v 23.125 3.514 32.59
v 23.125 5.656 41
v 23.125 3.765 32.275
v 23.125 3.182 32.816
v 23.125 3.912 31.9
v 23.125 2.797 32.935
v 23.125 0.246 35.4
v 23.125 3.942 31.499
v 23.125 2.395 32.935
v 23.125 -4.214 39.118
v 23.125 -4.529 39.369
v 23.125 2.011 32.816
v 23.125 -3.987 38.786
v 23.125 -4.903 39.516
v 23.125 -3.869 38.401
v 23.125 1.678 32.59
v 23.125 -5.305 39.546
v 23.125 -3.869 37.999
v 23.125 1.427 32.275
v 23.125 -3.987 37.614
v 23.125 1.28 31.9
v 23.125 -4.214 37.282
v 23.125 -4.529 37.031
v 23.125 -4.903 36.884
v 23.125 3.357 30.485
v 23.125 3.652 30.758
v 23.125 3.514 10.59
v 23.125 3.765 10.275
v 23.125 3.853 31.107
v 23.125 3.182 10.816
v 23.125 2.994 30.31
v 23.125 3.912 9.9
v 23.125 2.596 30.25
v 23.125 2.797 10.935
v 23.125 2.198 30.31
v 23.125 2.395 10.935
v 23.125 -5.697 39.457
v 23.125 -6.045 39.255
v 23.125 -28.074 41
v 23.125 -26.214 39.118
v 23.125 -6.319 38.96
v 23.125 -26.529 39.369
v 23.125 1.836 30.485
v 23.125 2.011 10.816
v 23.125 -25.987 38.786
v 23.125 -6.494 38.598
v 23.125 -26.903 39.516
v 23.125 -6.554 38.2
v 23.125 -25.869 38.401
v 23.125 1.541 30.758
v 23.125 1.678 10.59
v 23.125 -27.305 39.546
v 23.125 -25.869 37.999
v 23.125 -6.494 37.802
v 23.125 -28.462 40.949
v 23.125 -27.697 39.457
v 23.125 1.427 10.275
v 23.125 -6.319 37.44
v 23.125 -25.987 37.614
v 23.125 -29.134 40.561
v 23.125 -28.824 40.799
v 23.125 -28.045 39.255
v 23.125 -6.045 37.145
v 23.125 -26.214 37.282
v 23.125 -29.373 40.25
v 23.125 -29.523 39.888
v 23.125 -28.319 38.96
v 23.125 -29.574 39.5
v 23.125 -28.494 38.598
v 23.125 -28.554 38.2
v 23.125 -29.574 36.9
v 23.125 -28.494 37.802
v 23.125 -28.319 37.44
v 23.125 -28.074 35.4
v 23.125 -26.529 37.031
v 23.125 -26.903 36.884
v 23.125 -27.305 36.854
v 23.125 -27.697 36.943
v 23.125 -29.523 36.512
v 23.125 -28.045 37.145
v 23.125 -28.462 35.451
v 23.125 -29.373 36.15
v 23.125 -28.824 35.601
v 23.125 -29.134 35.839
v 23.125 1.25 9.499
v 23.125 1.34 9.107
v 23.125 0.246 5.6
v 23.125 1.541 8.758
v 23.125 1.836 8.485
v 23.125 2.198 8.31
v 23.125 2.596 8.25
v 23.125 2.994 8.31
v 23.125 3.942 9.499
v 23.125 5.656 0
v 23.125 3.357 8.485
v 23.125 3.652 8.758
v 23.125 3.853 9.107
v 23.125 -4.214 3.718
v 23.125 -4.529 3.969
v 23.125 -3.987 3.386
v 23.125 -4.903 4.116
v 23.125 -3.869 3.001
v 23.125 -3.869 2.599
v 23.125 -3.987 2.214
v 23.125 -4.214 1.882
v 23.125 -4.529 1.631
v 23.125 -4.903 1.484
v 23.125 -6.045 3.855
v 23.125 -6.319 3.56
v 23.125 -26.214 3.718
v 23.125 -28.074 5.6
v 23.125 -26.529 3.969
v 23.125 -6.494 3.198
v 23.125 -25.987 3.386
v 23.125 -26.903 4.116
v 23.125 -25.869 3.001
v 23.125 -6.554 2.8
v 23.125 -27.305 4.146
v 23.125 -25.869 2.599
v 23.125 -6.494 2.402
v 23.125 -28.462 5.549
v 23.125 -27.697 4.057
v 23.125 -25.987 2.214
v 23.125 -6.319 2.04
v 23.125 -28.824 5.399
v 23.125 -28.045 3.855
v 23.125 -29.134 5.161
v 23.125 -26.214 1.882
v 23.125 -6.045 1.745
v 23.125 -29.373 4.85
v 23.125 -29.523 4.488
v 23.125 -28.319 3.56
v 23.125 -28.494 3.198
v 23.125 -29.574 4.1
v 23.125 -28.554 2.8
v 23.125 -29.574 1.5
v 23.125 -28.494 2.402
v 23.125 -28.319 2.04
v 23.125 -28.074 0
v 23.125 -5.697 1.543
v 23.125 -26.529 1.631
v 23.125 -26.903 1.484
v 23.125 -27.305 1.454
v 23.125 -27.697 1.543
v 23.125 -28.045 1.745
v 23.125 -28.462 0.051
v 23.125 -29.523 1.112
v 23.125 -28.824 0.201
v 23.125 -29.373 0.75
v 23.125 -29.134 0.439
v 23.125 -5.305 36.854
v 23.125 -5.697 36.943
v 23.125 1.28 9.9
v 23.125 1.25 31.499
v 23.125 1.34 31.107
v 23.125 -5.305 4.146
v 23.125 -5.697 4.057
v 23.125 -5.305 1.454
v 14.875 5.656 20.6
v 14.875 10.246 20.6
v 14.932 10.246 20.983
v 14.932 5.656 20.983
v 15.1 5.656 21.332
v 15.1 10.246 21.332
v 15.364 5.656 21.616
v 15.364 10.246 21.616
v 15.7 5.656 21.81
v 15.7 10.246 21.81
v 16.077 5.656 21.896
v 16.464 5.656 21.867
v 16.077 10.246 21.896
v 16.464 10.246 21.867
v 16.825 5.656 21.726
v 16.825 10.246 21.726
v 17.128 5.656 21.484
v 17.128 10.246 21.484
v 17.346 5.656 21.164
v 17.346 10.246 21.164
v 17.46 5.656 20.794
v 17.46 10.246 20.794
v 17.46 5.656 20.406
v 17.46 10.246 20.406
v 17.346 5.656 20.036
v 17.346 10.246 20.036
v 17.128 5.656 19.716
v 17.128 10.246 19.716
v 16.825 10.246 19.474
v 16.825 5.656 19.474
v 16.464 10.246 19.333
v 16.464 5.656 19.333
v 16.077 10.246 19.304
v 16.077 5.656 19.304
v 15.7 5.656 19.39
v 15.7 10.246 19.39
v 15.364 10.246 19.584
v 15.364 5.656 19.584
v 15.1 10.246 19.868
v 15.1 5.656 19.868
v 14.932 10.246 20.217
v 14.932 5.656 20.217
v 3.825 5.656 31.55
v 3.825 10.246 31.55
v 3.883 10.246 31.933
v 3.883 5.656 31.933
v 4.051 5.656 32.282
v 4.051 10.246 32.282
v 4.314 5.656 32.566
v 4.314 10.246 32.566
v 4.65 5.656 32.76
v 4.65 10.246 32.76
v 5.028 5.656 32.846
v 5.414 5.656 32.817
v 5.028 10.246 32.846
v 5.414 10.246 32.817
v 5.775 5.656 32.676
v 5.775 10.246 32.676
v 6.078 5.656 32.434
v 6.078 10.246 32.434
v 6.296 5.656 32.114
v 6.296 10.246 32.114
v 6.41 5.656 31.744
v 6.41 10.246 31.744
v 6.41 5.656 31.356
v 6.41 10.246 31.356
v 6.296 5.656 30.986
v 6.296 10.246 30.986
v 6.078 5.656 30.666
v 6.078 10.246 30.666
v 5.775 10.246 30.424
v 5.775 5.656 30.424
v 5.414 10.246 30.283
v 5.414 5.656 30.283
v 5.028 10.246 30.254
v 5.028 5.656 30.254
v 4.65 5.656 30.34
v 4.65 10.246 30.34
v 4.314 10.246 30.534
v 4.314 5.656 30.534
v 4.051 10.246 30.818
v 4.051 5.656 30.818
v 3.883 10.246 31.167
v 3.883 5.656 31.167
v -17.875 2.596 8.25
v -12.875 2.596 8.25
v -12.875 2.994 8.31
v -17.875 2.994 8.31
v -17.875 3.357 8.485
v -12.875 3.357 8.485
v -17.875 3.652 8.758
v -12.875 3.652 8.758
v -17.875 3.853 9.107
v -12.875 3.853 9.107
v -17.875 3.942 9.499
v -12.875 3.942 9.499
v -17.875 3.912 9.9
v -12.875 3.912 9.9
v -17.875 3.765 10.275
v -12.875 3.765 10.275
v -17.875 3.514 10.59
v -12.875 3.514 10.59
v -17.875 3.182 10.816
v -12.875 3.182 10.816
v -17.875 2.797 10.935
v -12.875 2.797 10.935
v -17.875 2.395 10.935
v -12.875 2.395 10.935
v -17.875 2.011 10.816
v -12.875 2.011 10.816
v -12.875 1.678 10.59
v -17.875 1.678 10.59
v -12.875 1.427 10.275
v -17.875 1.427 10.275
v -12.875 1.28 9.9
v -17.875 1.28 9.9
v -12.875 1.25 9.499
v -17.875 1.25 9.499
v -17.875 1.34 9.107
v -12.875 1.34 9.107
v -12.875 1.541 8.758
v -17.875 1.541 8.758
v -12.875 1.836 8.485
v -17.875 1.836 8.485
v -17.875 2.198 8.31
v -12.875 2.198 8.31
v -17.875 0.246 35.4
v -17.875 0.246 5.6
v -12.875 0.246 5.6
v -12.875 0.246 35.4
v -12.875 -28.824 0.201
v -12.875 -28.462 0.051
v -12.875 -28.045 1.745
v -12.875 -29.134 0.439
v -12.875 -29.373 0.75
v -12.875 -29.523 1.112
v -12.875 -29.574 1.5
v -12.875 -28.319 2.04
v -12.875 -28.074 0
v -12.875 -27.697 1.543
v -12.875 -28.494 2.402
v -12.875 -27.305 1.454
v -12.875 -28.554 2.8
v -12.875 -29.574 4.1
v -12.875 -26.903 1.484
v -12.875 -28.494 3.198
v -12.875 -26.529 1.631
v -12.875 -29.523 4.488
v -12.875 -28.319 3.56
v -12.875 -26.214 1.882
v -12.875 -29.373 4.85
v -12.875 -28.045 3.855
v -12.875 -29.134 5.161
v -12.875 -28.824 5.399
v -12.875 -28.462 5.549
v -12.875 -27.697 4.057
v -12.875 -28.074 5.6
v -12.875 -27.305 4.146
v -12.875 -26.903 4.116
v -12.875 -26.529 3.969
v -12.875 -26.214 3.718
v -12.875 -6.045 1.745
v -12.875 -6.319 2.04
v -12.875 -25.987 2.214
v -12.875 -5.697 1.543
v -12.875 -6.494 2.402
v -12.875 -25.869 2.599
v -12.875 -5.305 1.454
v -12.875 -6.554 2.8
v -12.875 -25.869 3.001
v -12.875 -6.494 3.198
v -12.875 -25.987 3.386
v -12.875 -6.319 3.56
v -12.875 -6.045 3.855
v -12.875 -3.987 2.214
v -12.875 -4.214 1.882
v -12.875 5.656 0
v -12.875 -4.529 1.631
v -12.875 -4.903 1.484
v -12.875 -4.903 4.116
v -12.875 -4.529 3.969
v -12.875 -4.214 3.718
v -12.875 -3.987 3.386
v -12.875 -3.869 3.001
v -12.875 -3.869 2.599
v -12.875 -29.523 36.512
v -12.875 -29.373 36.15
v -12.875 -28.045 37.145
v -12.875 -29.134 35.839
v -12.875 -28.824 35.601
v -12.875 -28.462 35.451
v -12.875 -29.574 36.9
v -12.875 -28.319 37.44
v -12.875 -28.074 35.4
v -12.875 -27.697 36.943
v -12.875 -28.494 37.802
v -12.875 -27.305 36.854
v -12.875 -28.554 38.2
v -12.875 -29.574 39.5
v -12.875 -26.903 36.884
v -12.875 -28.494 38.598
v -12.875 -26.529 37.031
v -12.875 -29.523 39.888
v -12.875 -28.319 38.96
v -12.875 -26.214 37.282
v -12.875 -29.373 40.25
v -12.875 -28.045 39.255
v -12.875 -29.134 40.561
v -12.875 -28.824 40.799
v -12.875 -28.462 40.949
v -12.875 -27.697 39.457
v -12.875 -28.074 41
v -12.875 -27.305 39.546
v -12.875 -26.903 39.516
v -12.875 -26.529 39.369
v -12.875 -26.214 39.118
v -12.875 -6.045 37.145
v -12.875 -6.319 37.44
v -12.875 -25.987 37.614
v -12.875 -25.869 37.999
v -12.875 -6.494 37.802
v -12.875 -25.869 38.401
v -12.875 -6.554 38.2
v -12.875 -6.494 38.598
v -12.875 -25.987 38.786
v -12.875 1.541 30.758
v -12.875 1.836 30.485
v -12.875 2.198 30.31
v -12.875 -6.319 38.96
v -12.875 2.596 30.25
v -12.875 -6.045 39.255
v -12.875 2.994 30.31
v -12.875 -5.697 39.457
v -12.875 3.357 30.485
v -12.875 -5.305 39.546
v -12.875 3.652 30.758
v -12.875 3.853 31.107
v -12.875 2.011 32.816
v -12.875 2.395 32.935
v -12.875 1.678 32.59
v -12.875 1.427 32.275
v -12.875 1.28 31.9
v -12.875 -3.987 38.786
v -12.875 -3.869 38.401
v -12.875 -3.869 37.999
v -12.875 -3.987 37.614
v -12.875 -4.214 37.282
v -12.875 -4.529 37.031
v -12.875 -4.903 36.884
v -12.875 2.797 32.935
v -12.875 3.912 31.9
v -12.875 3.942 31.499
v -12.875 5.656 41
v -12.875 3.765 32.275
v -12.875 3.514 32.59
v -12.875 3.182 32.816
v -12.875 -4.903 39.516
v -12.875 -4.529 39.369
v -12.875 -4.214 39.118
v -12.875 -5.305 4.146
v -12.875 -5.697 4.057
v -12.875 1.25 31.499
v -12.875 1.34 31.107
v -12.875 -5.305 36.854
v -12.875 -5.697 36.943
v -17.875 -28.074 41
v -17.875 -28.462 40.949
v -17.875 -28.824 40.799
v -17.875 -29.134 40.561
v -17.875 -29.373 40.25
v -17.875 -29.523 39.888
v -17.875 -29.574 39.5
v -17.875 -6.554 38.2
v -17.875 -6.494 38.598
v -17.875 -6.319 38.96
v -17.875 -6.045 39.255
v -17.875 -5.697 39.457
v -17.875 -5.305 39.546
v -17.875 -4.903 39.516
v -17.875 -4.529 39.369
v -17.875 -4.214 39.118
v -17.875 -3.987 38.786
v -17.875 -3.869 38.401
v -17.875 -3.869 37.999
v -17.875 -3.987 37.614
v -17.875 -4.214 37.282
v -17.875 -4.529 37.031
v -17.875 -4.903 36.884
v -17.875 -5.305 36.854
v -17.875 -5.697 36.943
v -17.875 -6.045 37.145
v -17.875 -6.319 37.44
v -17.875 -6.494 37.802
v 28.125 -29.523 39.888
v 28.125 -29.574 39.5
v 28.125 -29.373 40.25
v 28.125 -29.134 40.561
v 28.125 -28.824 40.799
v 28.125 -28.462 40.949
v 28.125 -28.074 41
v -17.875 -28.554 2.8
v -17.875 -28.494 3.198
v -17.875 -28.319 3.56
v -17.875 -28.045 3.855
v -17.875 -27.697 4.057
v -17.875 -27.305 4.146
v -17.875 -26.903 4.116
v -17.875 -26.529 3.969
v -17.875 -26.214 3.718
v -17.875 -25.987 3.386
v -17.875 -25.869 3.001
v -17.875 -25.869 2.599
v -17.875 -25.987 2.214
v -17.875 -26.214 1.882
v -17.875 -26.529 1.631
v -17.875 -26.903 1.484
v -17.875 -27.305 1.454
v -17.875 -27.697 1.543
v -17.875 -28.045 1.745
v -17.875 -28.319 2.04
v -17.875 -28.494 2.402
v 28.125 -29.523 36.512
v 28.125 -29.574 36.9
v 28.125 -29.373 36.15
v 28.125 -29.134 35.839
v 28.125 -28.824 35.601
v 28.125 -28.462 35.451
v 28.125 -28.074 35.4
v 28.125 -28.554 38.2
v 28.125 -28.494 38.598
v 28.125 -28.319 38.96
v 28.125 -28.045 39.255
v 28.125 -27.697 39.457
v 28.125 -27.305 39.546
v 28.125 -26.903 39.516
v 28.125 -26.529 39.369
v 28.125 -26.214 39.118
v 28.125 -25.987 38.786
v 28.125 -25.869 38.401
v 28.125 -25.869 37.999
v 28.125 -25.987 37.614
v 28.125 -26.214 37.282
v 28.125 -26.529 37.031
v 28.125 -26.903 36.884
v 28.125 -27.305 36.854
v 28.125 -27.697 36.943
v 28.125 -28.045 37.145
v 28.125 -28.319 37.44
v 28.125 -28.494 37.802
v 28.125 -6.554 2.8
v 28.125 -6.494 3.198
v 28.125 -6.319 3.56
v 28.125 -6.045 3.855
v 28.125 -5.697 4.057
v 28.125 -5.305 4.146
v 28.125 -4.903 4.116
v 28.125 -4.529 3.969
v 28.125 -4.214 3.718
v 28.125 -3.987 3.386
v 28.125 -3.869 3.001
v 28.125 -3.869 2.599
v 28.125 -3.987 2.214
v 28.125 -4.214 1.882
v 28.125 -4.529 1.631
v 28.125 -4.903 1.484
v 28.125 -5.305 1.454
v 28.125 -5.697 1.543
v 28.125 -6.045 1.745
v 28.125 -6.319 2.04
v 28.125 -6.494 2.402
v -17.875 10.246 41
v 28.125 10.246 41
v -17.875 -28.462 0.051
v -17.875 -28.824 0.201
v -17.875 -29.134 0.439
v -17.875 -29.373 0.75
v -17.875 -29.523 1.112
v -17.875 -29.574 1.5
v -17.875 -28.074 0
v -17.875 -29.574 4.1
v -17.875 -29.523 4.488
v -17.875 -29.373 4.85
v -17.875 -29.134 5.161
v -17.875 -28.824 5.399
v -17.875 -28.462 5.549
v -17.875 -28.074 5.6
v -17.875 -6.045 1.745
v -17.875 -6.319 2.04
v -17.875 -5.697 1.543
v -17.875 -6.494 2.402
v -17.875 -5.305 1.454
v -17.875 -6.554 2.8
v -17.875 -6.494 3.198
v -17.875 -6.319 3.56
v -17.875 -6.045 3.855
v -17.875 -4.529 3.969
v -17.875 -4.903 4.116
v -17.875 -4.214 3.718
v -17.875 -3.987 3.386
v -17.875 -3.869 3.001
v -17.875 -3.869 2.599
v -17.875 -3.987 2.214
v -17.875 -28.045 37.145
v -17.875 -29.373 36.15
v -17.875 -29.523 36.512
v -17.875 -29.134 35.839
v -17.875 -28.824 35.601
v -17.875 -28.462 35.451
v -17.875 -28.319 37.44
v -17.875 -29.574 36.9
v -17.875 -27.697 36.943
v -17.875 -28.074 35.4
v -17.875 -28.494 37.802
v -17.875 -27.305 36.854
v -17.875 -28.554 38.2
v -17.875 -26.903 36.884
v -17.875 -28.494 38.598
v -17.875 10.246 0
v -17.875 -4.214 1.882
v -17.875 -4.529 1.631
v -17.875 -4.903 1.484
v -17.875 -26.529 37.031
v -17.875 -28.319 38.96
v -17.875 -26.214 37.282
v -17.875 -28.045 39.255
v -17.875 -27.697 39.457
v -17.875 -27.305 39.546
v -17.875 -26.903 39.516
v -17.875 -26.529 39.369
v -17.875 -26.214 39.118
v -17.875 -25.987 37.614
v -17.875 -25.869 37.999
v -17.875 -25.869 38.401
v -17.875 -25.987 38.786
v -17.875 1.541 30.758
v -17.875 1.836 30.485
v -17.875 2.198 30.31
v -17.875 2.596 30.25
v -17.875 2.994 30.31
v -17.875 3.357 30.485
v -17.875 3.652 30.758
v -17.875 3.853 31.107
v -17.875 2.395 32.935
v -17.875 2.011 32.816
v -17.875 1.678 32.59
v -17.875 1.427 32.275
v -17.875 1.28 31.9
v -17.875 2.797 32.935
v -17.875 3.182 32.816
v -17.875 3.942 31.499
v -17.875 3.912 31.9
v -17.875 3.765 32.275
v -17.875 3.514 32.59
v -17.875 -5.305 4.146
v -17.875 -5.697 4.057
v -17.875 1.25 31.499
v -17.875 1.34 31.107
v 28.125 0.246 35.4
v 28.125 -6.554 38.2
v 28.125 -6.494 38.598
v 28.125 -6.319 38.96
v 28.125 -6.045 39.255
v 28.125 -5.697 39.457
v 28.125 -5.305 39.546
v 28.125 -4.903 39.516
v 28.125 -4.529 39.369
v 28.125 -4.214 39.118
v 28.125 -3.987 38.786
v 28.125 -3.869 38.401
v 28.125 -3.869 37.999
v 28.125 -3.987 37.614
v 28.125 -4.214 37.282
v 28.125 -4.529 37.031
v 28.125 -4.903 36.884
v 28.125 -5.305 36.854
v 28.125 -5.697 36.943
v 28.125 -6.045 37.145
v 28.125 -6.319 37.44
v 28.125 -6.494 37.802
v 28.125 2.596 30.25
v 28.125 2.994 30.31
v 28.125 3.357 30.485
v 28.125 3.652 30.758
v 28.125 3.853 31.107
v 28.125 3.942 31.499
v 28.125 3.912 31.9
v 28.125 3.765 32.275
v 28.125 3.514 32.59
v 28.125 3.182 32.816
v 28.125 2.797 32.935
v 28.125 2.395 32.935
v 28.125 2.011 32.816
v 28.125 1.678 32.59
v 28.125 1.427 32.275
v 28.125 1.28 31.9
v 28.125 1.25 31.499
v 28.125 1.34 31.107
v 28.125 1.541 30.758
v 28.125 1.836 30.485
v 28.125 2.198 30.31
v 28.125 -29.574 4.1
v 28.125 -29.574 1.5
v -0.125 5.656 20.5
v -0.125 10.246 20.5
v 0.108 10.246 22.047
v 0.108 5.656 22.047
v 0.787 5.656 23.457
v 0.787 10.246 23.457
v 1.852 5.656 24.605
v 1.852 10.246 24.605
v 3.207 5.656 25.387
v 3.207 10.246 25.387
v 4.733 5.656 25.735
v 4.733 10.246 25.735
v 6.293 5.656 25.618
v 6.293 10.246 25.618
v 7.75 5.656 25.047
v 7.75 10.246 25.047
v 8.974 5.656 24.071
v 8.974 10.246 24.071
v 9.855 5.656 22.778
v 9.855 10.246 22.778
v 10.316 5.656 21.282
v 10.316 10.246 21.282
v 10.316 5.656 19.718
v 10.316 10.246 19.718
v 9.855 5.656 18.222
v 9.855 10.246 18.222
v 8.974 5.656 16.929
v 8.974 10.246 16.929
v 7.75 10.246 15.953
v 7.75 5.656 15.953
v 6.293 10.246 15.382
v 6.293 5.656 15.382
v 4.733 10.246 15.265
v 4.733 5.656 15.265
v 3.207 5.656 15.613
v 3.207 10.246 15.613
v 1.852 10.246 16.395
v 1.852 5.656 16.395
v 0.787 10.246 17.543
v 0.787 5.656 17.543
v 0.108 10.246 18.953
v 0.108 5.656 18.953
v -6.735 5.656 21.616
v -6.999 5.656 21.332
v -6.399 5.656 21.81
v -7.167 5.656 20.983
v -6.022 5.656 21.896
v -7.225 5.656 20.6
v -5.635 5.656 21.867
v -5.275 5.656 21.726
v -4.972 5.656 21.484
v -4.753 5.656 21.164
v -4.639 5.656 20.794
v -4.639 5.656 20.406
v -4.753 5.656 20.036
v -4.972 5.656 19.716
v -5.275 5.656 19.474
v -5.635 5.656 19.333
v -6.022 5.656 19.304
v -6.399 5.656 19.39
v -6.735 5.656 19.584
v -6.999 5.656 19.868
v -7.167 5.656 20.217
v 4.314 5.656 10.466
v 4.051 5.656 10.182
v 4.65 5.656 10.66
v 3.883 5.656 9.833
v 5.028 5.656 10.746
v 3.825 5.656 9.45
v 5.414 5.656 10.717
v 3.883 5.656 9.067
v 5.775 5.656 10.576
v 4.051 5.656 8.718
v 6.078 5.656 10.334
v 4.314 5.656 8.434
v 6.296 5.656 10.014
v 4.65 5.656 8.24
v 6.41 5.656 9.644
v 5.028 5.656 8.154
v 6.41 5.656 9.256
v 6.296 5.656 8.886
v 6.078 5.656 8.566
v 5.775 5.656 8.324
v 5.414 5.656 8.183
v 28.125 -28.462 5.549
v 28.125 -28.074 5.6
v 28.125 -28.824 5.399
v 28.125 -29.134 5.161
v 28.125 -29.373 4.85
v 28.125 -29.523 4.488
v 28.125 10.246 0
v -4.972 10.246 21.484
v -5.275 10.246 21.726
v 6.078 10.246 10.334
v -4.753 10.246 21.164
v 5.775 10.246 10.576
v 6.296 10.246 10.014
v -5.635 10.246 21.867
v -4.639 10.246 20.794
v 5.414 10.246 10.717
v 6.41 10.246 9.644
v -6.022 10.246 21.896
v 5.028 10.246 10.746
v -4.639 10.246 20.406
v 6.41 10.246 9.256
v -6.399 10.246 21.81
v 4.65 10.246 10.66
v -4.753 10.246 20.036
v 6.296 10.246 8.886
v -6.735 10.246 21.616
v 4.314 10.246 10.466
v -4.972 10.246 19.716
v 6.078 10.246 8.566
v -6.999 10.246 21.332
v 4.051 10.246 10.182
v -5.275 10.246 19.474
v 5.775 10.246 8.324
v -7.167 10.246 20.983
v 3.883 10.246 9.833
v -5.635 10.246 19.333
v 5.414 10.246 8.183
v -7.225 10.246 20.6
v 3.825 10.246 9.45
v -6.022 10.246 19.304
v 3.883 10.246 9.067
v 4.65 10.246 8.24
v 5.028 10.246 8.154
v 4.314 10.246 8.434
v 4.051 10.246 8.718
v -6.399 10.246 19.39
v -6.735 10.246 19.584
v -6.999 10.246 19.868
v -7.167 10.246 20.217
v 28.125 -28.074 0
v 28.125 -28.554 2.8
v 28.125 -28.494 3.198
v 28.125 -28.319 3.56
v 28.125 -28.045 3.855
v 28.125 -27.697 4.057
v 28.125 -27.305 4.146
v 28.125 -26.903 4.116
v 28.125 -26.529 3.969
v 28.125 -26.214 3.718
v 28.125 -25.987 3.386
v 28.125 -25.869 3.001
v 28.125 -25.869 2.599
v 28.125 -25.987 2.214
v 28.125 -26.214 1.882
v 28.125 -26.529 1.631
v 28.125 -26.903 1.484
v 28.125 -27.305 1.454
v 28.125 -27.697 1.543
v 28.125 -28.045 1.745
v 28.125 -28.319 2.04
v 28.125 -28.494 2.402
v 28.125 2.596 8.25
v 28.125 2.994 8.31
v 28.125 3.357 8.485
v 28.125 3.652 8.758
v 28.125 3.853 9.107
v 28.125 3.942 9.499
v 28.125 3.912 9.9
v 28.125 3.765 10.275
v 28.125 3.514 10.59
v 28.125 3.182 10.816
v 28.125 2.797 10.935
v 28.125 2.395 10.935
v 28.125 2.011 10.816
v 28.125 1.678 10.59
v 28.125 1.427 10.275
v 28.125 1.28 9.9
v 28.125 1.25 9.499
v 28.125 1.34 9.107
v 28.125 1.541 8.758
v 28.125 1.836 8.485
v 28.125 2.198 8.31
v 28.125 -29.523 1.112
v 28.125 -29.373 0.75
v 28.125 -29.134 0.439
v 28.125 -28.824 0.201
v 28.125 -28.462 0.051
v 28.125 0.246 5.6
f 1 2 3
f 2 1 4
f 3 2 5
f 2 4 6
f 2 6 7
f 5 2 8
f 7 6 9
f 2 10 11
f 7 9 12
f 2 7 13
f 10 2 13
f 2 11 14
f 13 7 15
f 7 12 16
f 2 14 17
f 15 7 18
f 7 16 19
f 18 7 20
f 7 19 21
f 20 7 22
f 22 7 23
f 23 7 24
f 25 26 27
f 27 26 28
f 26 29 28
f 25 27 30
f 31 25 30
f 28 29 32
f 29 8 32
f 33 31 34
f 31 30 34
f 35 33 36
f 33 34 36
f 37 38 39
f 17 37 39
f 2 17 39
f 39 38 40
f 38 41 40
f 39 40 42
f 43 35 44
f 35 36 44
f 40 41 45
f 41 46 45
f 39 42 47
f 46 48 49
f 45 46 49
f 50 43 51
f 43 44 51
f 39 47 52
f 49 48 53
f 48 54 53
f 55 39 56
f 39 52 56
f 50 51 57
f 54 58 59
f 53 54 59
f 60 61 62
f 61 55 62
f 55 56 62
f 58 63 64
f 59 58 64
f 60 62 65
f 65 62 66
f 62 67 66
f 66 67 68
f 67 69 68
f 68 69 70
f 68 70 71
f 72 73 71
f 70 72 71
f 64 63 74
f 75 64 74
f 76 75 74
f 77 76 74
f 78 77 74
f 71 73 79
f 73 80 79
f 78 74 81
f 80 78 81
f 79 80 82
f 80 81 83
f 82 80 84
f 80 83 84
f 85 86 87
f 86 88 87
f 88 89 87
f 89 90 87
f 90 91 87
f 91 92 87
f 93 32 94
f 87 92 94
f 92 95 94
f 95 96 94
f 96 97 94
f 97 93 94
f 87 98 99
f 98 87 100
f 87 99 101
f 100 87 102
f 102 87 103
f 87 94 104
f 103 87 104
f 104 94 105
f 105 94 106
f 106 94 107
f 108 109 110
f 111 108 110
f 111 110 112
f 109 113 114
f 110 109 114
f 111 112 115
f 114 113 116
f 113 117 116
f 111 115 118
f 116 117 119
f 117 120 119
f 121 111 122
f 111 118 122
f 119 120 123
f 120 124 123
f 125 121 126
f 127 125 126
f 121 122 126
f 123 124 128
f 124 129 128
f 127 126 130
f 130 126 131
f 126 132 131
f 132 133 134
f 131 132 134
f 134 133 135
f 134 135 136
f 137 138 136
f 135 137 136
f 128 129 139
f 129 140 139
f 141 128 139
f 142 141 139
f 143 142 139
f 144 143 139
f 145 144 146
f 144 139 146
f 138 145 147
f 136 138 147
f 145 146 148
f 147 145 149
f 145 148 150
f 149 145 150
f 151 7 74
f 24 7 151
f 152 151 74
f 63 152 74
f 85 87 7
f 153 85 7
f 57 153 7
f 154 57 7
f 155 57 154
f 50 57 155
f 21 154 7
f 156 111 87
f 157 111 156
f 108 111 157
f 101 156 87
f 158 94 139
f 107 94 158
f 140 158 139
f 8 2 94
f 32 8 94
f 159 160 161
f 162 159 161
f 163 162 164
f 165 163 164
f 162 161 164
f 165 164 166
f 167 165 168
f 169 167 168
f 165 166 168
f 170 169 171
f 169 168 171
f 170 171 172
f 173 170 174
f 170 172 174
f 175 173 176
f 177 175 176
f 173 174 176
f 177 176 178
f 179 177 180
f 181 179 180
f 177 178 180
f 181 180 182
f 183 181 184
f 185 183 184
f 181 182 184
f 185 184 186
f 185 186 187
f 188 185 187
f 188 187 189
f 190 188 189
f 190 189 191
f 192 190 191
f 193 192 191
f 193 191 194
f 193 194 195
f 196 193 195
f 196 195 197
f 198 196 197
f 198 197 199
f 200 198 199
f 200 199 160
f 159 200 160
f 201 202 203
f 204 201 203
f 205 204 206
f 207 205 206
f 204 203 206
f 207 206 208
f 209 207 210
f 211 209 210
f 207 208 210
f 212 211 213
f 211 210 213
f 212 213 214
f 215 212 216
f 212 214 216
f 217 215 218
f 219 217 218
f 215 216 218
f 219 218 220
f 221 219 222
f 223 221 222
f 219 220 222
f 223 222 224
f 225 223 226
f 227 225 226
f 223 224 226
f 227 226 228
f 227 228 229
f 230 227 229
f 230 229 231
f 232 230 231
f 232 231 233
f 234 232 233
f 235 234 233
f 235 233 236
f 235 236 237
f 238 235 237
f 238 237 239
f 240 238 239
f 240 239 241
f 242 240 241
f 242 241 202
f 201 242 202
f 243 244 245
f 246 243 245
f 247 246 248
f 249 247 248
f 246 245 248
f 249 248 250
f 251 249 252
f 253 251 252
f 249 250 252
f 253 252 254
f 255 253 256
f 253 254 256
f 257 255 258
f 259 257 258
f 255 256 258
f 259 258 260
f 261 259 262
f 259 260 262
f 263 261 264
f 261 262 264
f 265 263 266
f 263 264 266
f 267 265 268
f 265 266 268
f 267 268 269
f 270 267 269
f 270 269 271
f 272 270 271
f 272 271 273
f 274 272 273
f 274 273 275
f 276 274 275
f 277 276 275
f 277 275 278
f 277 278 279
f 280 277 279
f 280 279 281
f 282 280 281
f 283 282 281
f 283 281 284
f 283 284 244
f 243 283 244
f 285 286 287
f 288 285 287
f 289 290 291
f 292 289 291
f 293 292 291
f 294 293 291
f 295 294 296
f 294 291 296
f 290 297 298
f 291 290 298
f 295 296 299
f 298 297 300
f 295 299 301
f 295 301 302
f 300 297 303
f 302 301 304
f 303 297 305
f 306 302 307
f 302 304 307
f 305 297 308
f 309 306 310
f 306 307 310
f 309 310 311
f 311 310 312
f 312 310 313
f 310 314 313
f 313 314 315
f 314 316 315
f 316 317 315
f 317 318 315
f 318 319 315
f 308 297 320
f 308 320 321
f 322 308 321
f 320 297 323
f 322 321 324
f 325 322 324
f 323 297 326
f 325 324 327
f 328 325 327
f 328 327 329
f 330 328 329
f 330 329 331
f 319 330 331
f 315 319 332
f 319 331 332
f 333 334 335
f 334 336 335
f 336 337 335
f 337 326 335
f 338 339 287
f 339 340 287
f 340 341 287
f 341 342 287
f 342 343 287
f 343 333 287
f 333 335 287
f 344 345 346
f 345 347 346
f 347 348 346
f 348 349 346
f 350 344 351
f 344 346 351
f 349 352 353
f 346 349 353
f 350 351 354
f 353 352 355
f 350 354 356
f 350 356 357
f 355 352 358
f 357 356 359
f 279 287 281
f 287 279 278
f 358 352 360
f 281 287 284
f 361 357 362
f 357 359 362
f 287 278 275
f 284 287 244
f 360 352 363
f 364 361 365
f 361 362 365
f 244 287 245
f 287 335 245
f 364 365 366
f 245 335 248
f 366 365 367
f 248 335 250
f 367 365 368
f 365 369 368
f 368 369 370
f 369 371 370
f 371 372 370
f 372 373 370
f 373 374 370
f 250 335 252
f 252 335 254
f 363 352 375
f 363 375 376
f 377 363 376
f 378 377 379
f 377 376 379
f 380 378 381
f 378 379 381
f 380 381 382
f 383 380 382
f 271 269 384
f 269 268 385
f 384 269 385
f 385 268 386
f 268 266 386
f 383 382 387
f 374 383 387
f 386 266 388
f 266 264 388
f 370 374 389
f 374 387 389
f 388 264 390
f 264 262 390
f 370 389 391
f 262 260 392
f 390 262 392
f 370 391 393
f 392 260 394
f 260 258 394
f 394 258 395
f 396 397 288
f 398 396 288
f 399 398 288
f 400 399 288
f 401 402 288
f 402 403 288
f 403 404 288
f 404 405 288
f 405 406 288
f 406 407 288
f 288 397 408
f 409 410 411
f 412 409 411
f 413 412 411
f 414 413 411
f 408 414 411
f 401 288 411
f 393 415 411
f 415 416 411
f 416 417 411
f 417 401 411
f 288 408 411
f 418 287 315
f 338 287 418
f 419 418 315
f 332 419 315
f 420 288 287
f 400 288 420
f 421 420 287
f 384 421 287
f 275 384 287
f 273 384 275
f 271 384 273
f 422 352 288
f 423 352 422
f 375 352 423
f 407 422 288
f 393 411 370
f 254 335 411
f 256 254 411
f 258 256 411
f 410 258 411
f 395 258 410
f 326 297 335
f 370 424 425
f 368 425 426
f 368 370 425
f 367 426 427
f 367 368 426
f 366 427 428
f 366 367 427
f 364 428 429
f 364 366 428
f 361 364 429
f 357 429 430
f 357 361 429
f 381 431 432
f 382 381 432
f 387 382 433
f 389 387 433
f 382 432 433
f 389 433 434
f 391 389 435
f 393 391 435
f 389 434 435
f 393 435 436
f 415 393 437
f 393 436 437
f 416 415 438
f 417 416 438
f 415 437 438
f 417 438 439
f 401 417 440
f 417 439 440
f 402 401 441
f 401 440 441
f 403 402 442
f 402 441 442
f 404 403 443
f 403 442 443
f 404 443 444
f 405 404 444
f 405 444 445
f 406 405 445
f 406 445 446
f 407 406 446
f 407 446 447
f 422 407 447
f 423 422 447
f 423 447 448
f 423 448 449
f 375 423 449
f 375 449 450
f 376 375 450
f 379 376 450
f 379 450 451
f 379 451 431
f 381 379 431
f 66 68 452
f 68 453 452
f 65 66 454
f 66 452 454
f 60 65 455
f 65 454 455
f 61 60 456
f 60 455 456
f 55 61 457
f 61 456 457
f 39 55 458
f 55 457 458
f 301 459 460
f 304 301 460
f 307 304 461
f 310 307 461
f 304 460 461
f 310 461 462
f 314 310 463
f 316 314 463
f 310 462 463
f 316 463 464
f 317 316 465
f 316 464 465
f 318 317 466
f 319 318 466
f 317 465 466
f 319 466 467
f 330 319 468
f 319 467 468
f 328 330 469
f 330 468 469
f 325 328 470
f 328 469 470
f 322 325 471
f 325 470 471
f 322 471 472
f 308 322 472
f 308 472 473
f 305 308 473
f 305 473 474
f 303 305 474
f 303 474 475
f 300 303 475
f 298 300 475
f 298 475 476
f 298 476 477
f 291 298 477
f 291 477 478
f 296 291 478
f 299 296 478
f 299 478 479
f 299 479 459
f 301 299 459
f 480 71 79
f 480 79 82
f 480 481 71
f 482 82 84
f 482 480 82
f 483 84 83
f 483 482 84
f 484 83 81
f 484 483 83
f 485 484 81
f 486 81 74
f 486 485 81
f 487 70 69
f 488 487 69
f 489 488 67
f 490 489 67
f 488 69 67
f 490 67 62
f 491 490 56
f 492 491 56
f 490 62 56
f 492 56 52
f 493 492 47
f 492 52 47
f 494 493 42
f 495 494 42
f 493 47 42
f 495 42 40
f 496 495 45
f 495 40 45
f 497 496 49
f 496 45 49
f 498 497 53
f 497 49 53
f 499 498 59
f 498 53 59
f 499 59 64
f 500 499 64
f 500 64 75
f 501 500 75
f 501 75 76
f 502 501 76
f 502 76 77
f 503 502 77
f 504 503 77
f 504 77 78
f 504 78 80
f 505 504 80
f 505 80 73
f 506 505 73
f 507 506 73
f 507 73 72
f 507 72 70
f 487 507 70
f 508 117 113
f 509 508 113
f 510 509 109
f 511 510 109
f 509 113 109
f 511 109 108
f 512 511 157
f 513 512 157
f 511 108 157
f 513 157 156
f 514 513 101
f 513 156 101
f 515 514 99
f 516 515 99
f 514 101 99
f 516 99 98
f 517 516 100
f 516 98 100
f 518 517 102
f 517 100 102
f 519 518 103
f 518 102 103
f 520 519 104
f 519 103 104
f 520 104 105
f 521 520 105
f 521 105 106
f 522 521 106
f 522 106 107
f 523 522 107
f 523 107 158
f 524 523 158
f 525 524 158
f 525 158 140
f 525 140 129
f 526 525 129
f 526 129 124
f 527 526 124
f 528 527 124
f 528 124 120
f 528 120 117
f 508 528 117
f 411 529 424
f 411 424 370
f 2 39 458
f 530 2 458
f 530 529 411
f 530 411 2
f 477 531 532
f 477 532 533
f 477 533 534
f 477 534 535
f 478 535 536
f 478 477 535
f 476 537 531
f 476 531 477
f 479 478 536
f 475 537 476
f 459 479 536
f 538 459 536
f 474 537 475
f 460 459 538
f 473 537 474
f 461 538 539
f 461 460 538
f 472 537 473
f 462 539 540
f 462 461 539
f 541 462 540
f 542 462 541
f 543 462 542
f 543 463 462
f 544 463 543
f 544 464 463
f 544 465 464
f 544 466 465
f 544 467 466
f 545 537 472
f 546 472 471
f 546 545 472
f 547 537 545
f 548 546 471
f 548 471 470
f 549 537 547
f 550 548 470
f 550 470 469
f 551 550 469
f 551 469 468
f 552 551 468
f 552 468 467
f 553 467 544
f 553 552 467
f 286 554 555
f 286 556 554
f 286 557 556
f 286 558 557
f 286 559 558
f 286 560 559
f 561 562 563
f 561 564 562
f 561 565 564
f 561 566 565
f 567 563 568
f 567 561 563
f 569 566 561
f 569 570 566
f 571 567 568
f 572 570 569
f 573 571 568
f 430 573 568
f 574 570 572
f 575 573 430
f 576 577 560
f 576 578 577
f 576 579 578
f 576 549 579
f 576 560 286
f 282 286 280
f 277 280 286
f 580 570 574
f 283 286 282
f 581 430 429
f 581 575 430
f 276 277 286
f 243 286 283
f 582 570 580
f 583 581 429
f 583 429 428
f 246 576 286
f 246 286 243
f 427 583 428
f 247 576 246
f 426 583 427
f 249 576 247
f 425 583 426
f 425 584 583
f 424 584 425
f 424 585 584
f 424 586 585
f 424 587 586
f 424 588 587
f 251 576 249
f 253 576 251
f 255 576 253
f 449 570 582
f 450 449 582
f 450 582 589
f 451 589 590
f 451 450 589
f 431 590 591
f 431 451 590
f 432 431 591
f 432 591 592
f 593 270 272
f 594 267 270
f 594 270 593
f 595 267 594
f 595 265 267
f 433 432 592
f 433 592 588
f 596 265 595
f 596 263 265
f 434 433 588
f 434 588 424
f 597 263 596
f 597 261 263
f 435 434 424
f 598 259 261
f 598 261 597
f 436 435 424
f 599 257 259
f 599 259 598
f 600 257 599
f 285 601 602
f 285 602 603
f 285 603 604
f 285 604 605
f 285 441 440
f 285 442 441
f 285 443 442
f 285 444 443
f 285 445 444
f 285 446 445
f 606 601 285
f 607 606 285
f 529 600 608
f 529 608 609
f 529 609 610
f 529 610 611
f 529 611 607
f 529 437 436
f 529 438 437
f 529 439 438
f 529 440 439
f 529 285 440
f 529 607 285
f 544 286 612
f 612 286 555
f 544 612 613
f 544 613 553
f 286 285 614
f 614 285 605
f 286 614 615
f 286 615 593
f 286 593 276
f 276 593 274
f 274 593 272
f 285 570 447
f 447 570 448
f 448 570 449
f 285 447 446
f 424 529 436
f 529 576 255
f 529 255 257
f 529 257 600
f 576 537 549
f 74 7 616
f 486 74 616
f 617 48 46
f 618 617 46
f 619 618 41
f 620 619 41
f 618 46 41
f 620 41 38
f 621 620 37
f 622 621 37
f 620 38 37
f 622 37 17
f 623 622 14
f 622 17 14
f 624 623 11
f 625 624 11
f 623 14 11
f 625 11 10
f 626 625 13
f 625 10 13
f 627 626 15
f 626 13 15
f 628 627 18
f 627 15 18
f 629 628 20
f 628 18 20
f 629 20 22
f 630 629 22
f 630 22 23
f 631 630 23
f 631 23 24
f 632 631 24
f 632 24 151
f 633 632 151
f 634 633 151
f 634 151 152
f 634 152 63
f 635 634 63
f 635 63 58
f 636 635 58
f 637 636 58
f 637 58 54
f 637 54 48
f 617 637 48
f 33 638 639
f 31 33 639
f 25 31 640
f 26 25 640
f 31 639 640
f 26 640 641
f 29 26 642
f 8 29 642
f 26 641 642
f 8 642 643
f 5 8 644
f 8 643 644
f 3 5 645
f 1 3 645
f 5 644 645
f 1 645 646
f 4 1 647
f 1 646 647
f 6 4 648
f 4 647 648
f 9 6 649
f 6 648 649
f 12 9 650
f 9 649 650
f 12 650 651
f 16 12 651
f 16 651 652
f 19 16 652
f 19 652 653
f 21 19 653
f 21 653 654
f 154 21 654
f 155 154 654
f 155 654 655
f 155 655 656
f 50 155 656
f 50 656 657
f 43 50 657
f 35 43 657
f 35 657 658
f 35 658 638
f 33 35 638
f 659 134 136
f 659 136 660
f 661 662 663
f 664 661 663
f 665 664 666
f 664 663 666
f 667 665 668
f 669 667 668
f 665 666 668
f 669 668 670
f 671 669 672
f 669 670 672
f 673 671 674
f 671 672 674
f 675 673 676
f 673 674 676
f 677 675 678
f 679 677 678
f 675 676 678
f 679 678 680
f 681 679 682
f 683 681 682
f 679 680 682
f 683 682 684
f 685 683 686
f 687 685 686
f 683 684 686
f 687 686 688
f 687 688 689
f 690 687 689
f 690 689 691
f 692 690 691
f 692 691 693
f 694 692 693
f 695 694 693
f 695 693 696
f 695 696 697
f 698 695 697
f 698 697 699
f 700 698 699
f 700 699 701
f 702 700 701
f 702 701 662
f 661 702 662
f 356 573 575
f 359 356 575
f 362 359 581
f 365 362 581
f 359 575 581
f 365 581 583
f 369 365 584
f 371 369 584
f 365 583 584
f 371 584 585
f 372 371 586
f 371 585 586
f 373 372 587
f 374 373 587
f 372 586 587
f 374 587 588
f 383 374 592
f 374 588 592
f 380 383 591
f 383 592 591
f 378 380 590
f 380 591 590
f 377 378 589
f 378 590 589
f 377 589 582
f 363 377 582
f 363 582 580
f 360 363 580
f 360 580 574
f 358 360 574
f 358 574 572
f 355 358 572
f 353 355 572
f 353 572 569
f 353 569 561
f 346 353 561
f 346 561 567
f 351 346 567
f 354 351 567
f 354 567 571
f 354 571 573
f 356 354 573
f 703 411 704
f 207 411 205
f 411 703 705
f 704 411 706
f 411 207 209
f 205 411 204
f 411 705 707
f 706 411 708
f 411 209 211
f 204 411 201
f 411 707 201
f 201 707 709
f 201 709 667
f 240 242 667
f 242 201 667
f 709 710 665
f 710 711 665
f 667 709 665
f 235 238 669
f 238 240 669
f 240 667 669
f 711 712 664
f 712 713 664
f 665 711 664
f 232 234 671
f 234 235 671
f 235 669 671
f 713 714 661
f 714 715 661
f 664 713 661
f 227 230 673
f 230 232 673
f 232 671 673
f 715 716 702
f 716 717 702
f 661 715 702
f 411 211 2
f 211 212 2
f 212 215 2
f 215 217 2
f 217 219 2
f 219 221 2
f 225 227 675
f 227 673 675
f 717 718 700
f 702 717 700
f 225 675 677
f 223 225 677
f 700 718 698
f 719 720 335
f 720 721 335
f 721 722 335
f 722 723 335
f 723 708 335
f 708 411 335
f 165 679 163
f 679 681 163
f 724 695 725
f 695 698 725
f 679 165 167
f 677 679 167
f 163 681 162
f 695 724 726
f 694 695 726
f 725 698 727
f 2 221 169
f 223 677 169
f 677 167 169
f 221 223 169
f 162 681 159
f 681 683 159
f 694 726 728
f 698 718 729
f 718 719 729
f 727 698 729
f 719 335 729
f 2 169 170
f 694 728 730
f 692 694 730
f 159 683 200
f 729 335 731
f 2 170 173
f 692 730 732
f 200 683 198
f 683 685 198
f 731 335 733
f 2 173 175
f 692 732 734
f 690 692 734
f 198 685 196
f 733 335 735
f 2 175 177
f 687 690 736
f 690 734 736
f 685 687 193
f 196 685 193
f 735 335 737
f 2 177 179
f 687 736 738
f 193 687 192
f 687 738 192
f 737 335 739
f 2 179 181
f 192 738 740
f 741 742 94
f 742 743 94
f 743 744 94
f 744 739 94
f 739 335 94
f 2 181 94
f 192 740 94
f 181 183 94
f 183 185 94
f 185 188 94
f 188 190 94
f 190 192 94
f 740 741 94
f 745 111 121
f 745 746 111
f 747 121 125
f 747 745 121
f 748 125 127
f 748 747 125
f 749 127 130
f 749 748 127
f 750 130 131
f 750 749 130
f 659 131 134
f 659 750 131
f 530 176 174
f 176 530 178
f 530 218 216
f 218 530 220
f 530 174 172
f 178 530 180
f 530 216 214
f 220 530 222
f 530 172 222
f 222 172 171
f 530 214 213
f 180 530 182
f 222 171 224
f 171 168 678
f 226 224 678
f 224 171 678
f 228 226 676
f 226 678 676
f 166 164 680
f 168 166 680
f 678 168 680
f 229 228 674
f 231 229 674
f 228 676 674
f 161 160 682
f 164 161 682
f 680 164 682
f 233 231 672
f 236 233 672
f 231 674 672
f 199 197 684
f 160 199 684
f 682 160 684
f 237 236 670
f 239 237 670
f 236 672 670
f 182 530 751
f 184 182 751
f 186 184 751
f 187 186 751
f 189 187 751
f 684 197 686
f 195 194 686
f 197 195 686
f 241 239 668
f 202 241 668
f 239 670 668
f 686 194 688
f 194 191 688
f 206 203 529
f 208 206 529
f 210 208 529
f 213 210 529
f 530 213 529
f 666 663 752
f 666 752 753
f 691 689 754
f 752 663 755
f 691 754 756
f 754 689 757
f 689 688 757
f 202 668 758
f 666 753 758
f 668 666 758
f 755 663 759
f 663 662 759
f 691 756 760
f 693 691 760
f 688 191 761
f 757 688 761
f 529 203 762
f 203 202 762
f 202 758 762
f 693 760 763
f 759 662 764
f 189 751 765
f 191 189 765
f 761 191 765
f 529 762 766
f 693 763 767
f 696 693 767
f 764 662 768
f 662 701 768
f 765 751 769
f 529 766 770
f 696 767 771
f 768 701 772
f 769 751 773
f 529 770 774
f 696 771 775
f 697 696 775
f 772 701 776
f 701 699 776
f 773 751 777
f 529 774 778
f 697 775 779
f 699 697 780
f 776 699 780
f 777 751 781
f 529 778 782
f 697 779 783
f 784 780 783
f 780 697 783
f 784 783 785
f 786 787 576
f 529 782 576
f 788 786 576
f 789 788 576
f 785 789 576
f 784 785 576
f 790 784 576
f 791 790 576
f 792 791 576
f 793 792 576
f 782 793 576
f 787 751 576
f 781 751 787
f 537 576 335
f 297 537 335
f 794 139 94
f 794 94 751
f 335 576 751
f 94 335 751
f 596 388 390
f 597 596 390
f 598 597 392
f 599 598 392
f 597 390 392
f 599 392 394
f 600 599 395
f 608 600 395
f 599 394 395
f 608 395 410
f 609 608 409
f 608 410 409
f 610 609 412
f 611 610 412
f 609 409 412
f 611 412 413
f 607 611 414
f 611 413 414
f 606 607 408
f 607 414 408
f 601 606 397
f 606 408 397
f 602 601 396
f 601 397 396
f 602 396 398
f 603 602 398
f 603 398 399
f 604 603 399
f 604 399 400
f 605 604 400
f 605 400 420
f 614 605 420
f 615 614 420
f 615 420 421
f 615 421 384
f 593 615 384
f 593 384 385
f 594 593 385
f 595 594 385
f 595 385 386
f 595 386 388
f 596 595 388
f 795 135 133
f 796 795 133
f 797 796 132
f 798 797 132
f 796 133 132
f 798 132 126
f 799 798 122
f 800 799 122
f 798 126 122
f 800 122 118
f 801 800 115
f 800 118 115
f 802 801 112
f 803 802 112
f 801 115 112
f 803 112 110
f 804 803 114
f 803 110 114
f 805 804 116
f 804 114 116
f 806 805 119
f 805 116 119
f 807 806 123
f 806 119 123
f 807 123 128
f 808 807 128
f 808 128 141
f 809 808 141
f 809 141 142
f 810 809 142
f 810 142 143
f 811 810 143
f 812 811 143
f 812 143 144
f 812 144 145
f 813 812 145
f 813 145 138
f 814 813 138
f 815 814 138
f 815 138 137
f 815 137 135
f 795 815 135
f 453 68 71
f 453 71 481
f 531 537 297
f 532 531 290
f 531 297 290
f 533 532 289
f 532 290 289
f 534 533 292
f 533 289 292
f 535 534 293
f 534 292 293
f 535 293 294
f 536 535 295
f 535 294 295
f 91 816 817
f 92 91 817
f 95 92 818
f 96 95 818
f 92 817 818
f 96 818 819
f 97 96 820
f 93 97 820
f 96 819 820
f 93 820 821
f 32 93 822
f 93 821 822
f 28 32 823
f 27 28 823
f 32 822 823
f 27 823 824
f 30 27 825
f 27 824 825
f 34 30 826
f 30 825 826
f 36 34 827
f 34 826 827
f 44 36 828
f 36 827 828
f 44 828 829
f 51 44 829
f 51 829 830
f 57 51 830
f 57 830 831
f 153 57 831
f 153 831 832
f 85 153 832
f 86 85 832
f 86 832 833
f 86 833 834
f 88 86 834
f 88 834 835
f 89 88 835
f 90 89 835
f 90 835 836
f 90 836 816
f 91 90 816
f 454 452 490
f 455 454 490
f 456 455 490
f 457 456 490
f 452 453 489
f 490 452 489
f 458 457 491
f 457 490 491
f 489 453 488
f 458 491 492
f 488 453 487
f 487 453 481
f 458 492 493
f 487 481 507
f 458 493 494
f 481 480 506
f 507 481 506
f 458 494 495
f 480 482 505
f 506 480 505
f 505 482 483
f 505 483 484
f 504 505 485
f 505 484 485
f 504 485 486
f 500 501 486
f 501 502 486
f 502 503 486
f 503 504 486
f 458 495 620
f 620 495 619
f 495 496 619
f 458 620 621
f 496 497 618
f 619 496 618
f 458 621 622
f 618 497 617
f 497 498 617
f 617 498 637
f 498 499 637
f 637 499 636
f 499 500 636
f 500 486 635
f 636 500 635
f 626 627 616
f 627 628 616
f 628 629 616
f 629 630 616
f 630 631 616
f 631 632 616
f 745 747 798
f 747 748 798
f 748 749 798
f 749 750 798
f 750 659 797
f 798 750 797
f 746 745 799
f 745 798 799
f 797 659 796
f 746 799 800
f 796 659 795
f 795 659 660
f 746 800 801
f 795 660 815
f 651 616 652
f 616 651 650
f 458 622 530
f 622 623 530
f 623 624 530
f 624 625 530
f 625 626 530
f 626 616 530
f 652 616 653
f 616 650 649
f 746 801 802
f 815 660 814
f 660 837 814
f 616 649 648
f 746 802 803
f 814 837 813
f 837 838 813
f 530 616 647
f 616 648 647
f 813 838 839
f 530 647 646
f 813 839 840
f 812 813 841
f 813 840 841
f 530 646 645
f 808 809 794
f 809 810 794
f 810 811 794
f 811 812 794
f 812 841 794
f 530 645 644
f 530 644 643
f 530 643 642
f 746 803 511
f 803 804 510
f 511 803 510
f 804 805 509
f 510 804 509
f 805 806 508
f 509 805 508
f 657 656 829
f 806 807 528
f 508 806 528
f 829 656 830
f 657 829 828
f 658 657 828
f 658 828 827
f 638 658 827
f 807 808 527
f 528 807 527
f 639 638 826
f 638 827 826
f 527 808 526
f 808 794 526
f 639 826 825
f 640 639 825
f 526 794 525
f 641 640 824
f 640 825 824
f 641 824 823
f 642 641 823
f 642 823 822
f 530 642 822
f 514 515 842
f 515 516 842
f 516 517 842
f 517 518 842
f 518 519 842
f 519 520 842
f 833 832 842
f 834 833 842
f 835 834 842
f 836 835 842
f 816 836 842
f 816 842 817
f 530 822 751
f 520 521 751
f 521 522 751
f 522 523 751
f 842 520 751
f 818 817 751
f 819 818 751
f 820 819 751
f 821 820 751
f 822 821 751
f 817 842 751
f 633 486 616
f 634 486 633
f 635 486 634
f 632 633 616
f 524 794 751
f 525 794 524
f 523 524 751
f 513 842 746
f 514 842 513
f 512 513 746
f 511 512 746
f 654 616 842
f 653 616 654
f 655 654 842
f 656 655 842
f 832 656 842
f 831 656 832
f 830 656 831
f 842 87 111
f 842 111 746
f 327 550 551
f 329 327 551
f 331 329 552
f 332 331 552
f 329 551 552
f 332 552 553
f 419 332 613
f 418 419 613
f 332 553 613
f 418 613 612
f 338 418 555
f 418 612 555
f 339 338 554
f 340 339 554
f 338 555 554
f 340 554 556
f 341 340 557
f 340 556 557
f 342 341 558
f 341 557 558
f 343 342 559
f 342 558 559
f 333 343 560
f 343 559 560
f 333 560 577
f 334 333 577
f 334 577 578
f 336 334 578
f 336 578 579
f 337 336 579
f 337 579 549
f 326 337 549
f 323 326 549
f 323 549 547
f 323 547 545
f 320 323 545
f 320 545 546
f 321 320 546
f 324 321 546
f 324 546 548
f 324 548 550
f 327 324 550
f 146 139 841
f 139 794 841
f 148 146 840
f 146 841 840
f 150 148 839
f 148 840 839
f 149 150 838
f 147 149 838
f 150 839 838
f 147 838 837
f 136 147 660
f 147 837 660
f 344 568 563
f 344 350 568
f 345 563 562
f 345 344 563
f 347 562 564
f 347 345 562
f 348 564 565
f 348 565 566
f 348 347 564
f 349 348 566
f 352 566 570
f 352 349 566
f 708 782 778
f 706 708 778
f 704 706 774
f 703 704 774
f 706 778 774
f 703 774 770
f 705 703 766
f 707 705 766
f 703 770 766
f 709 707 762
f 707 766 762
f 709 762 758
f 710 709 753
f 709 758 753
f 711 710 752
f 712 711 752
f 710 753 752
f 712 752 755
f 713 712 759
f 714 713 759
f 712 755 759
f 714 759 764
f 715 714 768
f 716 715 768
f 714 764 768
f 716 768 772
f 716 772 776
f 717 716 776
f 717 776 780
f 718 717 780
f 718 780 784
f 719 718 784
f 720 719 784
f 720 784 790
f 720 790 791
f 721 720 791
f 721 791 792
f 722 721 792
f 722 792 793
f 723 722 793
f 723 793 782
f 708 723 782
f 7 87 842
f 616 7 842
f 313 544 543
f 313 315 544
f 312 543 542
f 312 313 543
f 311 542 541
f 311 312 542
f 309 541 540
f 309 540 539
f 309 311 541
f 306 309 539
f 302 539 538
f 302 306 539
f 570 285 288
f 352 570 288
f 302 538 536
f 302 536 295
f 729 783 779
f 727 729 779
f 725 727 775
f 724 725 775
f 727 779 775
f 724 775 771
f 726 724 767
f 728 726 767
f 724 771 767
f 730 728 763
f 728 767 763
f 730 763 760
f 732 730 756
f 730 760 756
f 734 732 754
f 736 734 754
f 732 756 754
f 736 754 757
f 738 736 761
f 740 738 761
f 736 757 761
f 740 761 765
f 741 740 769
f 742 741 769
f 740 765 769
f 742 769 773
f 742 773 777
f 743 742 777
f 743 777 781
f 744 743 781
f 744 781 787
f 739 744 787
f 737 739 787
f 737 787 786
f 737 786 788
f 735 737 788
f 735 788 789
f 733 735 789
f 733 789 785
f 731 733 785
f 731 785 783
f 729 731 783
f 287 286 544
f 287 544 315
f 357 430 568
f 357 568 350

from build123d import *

# Parameters (mm, degrees)
BOSS_EXTRUDE1_DEPTH = 41
SKETCH2_W           = 5
SKETCH2_H           = 5.6
BOSS_EXTRUDE2_DEPTH = 29.82
FILLET1_R           = 1.5
SKETCH3_R           = 1.35
CUT_EXTRUDE1_DEPTH  = 49
SKETCH4_R           = 1.35
CUT_EXTRUDE2_DEPTH  = 49
SKETCH5_R           = 1.3
SKETCH5_R_2         = 5.25
CUT_EXTRUDE3_DEPTH  = 7


with BuildPart() as part:
    # Sketch1 → Boss-Extrude1 (new body)
    with BuildSketch(Plane.XY):
        Polygon((-17.875, 0.24625), (-12.875, 0.24625), (-12.875, 5.65625), (23.125, 5.65625), (23.125, 0.24625), (28.125, 0.24625), (28.125, 10.24625), (-17.875, 10.24625), align=None)
    extrude(amount=BOSS_EXTRUDE1_DEPTH)

    # Sketch2 → Boss-Extrude2 (add)
    with BuildSketch(Plane.XZ.offset(-0.24625)):
        with Locations((-15.375, 2.8)):
            Rectangle(SKETCH2_W, SKETCH2_H)
        with Locations((-15.375, 38.2)):
            Rectangle(SKETCH2_W, SKETCH2_H)
        with Locations((25.625, 38.2)):
            Rectangle(SKETCH2_W, SKETCH2_H)
        with Locations((25.625, 2.8)):
            Rectangle(SKETCH2_W, SKETCH2_H)
    extrude(amount=BOSS_EXTRUDE2_DEPTH)

    # Fillet1
    fillet1_edges = [part.edges().sort_by_distance(p)[0] for p in [
        (-15.375, -29.57375, 0),
        (-15.375, -29.57375, 5.6),
        (-15.375, -29.57375, 35.4),
        (-15.375, -29.57375, 41),
        (25.625, -29.57375, 41),
        (25.625, -29.57375, 35.4),
        (25.625, -29.57375, 5.6),
        (25.625, -29.57375, 0),
    ]]
    fillet(fillet1_edges, radius=FILLET1_R)

    # Sketch3 → Cut-Extrude1 (cut)
    with BuildSketch(Plane.ZY.offset(17.875)):
        with Locations(Location((38.2, -27.20375, 0), (0, 0, 270))):
            Circle(SKETCH3_R)
        with Locations(Location((2.8, -27.20375, 0), (0, 0, 270))):
            Circle(SKETCH3_R)
        with Locations(Location((38.2, -5.20375, 0), (0, 0, 270))):
            Circle(SKETCH3_R)
        with Locations(Location((2.8, -5.20375, 0), (0, 0, 270))):
            Circle(SKETCH3_R)
    extrude(amount=-CUT_EXTRUDE1_DEPTH, mode=Mode.SUBTRACT)

    # Sketch4 → Cut-Extrude2 (cut)
    with BuildSketch(Plane(origin=(28.125, 0, 0), x_dir=(0, 0, -1), z_dir=(1, 0, 0))):
        with Locations((-9.6, 2.59625)):
            Circle(SKETCH4_R)
        with Locations((-31.6, 2.59625)):
            Circle(SKETCH4_R)
    extrude(amount=-CUT_EXTRUDE2_DEPTH, mode=Mode.SUBTRACT)

    # Sketch5 → Cut-Extrude3 (cut)
    with BuildSketch(Plane(origin=(0, 10.24625, 0), x_dir=(1, 0, 0), z_dir=(0, 1, 0))):
        with Locations(Location((5.125, -9.45, 0), (0, 0, 180))):
            Circle(SKETCH5_R)
        with Locations(Location((-5.924547539, -20.599995905, 0), (0, 0, 180))):
            Circle(SKETCH5_R)
        with Locations(Location((5.125, -31.55, 0), (0, 0, 180))):
            Circle(SKETCH5_R)
        with Locations(Location((16.174547539, -20.599995905, 0), (0, 0, 180))):
            Circle(SKETCH5_R)
        with Locations(Location((5.125, -20.5, 0), (0, 0, 180))):
            Circle(SKETCH5_R_2)
    extrude(amount=-CUT_EXTRUDE3_DEPTH, mode=Mode.SUBTRACT)


solid = part.part
